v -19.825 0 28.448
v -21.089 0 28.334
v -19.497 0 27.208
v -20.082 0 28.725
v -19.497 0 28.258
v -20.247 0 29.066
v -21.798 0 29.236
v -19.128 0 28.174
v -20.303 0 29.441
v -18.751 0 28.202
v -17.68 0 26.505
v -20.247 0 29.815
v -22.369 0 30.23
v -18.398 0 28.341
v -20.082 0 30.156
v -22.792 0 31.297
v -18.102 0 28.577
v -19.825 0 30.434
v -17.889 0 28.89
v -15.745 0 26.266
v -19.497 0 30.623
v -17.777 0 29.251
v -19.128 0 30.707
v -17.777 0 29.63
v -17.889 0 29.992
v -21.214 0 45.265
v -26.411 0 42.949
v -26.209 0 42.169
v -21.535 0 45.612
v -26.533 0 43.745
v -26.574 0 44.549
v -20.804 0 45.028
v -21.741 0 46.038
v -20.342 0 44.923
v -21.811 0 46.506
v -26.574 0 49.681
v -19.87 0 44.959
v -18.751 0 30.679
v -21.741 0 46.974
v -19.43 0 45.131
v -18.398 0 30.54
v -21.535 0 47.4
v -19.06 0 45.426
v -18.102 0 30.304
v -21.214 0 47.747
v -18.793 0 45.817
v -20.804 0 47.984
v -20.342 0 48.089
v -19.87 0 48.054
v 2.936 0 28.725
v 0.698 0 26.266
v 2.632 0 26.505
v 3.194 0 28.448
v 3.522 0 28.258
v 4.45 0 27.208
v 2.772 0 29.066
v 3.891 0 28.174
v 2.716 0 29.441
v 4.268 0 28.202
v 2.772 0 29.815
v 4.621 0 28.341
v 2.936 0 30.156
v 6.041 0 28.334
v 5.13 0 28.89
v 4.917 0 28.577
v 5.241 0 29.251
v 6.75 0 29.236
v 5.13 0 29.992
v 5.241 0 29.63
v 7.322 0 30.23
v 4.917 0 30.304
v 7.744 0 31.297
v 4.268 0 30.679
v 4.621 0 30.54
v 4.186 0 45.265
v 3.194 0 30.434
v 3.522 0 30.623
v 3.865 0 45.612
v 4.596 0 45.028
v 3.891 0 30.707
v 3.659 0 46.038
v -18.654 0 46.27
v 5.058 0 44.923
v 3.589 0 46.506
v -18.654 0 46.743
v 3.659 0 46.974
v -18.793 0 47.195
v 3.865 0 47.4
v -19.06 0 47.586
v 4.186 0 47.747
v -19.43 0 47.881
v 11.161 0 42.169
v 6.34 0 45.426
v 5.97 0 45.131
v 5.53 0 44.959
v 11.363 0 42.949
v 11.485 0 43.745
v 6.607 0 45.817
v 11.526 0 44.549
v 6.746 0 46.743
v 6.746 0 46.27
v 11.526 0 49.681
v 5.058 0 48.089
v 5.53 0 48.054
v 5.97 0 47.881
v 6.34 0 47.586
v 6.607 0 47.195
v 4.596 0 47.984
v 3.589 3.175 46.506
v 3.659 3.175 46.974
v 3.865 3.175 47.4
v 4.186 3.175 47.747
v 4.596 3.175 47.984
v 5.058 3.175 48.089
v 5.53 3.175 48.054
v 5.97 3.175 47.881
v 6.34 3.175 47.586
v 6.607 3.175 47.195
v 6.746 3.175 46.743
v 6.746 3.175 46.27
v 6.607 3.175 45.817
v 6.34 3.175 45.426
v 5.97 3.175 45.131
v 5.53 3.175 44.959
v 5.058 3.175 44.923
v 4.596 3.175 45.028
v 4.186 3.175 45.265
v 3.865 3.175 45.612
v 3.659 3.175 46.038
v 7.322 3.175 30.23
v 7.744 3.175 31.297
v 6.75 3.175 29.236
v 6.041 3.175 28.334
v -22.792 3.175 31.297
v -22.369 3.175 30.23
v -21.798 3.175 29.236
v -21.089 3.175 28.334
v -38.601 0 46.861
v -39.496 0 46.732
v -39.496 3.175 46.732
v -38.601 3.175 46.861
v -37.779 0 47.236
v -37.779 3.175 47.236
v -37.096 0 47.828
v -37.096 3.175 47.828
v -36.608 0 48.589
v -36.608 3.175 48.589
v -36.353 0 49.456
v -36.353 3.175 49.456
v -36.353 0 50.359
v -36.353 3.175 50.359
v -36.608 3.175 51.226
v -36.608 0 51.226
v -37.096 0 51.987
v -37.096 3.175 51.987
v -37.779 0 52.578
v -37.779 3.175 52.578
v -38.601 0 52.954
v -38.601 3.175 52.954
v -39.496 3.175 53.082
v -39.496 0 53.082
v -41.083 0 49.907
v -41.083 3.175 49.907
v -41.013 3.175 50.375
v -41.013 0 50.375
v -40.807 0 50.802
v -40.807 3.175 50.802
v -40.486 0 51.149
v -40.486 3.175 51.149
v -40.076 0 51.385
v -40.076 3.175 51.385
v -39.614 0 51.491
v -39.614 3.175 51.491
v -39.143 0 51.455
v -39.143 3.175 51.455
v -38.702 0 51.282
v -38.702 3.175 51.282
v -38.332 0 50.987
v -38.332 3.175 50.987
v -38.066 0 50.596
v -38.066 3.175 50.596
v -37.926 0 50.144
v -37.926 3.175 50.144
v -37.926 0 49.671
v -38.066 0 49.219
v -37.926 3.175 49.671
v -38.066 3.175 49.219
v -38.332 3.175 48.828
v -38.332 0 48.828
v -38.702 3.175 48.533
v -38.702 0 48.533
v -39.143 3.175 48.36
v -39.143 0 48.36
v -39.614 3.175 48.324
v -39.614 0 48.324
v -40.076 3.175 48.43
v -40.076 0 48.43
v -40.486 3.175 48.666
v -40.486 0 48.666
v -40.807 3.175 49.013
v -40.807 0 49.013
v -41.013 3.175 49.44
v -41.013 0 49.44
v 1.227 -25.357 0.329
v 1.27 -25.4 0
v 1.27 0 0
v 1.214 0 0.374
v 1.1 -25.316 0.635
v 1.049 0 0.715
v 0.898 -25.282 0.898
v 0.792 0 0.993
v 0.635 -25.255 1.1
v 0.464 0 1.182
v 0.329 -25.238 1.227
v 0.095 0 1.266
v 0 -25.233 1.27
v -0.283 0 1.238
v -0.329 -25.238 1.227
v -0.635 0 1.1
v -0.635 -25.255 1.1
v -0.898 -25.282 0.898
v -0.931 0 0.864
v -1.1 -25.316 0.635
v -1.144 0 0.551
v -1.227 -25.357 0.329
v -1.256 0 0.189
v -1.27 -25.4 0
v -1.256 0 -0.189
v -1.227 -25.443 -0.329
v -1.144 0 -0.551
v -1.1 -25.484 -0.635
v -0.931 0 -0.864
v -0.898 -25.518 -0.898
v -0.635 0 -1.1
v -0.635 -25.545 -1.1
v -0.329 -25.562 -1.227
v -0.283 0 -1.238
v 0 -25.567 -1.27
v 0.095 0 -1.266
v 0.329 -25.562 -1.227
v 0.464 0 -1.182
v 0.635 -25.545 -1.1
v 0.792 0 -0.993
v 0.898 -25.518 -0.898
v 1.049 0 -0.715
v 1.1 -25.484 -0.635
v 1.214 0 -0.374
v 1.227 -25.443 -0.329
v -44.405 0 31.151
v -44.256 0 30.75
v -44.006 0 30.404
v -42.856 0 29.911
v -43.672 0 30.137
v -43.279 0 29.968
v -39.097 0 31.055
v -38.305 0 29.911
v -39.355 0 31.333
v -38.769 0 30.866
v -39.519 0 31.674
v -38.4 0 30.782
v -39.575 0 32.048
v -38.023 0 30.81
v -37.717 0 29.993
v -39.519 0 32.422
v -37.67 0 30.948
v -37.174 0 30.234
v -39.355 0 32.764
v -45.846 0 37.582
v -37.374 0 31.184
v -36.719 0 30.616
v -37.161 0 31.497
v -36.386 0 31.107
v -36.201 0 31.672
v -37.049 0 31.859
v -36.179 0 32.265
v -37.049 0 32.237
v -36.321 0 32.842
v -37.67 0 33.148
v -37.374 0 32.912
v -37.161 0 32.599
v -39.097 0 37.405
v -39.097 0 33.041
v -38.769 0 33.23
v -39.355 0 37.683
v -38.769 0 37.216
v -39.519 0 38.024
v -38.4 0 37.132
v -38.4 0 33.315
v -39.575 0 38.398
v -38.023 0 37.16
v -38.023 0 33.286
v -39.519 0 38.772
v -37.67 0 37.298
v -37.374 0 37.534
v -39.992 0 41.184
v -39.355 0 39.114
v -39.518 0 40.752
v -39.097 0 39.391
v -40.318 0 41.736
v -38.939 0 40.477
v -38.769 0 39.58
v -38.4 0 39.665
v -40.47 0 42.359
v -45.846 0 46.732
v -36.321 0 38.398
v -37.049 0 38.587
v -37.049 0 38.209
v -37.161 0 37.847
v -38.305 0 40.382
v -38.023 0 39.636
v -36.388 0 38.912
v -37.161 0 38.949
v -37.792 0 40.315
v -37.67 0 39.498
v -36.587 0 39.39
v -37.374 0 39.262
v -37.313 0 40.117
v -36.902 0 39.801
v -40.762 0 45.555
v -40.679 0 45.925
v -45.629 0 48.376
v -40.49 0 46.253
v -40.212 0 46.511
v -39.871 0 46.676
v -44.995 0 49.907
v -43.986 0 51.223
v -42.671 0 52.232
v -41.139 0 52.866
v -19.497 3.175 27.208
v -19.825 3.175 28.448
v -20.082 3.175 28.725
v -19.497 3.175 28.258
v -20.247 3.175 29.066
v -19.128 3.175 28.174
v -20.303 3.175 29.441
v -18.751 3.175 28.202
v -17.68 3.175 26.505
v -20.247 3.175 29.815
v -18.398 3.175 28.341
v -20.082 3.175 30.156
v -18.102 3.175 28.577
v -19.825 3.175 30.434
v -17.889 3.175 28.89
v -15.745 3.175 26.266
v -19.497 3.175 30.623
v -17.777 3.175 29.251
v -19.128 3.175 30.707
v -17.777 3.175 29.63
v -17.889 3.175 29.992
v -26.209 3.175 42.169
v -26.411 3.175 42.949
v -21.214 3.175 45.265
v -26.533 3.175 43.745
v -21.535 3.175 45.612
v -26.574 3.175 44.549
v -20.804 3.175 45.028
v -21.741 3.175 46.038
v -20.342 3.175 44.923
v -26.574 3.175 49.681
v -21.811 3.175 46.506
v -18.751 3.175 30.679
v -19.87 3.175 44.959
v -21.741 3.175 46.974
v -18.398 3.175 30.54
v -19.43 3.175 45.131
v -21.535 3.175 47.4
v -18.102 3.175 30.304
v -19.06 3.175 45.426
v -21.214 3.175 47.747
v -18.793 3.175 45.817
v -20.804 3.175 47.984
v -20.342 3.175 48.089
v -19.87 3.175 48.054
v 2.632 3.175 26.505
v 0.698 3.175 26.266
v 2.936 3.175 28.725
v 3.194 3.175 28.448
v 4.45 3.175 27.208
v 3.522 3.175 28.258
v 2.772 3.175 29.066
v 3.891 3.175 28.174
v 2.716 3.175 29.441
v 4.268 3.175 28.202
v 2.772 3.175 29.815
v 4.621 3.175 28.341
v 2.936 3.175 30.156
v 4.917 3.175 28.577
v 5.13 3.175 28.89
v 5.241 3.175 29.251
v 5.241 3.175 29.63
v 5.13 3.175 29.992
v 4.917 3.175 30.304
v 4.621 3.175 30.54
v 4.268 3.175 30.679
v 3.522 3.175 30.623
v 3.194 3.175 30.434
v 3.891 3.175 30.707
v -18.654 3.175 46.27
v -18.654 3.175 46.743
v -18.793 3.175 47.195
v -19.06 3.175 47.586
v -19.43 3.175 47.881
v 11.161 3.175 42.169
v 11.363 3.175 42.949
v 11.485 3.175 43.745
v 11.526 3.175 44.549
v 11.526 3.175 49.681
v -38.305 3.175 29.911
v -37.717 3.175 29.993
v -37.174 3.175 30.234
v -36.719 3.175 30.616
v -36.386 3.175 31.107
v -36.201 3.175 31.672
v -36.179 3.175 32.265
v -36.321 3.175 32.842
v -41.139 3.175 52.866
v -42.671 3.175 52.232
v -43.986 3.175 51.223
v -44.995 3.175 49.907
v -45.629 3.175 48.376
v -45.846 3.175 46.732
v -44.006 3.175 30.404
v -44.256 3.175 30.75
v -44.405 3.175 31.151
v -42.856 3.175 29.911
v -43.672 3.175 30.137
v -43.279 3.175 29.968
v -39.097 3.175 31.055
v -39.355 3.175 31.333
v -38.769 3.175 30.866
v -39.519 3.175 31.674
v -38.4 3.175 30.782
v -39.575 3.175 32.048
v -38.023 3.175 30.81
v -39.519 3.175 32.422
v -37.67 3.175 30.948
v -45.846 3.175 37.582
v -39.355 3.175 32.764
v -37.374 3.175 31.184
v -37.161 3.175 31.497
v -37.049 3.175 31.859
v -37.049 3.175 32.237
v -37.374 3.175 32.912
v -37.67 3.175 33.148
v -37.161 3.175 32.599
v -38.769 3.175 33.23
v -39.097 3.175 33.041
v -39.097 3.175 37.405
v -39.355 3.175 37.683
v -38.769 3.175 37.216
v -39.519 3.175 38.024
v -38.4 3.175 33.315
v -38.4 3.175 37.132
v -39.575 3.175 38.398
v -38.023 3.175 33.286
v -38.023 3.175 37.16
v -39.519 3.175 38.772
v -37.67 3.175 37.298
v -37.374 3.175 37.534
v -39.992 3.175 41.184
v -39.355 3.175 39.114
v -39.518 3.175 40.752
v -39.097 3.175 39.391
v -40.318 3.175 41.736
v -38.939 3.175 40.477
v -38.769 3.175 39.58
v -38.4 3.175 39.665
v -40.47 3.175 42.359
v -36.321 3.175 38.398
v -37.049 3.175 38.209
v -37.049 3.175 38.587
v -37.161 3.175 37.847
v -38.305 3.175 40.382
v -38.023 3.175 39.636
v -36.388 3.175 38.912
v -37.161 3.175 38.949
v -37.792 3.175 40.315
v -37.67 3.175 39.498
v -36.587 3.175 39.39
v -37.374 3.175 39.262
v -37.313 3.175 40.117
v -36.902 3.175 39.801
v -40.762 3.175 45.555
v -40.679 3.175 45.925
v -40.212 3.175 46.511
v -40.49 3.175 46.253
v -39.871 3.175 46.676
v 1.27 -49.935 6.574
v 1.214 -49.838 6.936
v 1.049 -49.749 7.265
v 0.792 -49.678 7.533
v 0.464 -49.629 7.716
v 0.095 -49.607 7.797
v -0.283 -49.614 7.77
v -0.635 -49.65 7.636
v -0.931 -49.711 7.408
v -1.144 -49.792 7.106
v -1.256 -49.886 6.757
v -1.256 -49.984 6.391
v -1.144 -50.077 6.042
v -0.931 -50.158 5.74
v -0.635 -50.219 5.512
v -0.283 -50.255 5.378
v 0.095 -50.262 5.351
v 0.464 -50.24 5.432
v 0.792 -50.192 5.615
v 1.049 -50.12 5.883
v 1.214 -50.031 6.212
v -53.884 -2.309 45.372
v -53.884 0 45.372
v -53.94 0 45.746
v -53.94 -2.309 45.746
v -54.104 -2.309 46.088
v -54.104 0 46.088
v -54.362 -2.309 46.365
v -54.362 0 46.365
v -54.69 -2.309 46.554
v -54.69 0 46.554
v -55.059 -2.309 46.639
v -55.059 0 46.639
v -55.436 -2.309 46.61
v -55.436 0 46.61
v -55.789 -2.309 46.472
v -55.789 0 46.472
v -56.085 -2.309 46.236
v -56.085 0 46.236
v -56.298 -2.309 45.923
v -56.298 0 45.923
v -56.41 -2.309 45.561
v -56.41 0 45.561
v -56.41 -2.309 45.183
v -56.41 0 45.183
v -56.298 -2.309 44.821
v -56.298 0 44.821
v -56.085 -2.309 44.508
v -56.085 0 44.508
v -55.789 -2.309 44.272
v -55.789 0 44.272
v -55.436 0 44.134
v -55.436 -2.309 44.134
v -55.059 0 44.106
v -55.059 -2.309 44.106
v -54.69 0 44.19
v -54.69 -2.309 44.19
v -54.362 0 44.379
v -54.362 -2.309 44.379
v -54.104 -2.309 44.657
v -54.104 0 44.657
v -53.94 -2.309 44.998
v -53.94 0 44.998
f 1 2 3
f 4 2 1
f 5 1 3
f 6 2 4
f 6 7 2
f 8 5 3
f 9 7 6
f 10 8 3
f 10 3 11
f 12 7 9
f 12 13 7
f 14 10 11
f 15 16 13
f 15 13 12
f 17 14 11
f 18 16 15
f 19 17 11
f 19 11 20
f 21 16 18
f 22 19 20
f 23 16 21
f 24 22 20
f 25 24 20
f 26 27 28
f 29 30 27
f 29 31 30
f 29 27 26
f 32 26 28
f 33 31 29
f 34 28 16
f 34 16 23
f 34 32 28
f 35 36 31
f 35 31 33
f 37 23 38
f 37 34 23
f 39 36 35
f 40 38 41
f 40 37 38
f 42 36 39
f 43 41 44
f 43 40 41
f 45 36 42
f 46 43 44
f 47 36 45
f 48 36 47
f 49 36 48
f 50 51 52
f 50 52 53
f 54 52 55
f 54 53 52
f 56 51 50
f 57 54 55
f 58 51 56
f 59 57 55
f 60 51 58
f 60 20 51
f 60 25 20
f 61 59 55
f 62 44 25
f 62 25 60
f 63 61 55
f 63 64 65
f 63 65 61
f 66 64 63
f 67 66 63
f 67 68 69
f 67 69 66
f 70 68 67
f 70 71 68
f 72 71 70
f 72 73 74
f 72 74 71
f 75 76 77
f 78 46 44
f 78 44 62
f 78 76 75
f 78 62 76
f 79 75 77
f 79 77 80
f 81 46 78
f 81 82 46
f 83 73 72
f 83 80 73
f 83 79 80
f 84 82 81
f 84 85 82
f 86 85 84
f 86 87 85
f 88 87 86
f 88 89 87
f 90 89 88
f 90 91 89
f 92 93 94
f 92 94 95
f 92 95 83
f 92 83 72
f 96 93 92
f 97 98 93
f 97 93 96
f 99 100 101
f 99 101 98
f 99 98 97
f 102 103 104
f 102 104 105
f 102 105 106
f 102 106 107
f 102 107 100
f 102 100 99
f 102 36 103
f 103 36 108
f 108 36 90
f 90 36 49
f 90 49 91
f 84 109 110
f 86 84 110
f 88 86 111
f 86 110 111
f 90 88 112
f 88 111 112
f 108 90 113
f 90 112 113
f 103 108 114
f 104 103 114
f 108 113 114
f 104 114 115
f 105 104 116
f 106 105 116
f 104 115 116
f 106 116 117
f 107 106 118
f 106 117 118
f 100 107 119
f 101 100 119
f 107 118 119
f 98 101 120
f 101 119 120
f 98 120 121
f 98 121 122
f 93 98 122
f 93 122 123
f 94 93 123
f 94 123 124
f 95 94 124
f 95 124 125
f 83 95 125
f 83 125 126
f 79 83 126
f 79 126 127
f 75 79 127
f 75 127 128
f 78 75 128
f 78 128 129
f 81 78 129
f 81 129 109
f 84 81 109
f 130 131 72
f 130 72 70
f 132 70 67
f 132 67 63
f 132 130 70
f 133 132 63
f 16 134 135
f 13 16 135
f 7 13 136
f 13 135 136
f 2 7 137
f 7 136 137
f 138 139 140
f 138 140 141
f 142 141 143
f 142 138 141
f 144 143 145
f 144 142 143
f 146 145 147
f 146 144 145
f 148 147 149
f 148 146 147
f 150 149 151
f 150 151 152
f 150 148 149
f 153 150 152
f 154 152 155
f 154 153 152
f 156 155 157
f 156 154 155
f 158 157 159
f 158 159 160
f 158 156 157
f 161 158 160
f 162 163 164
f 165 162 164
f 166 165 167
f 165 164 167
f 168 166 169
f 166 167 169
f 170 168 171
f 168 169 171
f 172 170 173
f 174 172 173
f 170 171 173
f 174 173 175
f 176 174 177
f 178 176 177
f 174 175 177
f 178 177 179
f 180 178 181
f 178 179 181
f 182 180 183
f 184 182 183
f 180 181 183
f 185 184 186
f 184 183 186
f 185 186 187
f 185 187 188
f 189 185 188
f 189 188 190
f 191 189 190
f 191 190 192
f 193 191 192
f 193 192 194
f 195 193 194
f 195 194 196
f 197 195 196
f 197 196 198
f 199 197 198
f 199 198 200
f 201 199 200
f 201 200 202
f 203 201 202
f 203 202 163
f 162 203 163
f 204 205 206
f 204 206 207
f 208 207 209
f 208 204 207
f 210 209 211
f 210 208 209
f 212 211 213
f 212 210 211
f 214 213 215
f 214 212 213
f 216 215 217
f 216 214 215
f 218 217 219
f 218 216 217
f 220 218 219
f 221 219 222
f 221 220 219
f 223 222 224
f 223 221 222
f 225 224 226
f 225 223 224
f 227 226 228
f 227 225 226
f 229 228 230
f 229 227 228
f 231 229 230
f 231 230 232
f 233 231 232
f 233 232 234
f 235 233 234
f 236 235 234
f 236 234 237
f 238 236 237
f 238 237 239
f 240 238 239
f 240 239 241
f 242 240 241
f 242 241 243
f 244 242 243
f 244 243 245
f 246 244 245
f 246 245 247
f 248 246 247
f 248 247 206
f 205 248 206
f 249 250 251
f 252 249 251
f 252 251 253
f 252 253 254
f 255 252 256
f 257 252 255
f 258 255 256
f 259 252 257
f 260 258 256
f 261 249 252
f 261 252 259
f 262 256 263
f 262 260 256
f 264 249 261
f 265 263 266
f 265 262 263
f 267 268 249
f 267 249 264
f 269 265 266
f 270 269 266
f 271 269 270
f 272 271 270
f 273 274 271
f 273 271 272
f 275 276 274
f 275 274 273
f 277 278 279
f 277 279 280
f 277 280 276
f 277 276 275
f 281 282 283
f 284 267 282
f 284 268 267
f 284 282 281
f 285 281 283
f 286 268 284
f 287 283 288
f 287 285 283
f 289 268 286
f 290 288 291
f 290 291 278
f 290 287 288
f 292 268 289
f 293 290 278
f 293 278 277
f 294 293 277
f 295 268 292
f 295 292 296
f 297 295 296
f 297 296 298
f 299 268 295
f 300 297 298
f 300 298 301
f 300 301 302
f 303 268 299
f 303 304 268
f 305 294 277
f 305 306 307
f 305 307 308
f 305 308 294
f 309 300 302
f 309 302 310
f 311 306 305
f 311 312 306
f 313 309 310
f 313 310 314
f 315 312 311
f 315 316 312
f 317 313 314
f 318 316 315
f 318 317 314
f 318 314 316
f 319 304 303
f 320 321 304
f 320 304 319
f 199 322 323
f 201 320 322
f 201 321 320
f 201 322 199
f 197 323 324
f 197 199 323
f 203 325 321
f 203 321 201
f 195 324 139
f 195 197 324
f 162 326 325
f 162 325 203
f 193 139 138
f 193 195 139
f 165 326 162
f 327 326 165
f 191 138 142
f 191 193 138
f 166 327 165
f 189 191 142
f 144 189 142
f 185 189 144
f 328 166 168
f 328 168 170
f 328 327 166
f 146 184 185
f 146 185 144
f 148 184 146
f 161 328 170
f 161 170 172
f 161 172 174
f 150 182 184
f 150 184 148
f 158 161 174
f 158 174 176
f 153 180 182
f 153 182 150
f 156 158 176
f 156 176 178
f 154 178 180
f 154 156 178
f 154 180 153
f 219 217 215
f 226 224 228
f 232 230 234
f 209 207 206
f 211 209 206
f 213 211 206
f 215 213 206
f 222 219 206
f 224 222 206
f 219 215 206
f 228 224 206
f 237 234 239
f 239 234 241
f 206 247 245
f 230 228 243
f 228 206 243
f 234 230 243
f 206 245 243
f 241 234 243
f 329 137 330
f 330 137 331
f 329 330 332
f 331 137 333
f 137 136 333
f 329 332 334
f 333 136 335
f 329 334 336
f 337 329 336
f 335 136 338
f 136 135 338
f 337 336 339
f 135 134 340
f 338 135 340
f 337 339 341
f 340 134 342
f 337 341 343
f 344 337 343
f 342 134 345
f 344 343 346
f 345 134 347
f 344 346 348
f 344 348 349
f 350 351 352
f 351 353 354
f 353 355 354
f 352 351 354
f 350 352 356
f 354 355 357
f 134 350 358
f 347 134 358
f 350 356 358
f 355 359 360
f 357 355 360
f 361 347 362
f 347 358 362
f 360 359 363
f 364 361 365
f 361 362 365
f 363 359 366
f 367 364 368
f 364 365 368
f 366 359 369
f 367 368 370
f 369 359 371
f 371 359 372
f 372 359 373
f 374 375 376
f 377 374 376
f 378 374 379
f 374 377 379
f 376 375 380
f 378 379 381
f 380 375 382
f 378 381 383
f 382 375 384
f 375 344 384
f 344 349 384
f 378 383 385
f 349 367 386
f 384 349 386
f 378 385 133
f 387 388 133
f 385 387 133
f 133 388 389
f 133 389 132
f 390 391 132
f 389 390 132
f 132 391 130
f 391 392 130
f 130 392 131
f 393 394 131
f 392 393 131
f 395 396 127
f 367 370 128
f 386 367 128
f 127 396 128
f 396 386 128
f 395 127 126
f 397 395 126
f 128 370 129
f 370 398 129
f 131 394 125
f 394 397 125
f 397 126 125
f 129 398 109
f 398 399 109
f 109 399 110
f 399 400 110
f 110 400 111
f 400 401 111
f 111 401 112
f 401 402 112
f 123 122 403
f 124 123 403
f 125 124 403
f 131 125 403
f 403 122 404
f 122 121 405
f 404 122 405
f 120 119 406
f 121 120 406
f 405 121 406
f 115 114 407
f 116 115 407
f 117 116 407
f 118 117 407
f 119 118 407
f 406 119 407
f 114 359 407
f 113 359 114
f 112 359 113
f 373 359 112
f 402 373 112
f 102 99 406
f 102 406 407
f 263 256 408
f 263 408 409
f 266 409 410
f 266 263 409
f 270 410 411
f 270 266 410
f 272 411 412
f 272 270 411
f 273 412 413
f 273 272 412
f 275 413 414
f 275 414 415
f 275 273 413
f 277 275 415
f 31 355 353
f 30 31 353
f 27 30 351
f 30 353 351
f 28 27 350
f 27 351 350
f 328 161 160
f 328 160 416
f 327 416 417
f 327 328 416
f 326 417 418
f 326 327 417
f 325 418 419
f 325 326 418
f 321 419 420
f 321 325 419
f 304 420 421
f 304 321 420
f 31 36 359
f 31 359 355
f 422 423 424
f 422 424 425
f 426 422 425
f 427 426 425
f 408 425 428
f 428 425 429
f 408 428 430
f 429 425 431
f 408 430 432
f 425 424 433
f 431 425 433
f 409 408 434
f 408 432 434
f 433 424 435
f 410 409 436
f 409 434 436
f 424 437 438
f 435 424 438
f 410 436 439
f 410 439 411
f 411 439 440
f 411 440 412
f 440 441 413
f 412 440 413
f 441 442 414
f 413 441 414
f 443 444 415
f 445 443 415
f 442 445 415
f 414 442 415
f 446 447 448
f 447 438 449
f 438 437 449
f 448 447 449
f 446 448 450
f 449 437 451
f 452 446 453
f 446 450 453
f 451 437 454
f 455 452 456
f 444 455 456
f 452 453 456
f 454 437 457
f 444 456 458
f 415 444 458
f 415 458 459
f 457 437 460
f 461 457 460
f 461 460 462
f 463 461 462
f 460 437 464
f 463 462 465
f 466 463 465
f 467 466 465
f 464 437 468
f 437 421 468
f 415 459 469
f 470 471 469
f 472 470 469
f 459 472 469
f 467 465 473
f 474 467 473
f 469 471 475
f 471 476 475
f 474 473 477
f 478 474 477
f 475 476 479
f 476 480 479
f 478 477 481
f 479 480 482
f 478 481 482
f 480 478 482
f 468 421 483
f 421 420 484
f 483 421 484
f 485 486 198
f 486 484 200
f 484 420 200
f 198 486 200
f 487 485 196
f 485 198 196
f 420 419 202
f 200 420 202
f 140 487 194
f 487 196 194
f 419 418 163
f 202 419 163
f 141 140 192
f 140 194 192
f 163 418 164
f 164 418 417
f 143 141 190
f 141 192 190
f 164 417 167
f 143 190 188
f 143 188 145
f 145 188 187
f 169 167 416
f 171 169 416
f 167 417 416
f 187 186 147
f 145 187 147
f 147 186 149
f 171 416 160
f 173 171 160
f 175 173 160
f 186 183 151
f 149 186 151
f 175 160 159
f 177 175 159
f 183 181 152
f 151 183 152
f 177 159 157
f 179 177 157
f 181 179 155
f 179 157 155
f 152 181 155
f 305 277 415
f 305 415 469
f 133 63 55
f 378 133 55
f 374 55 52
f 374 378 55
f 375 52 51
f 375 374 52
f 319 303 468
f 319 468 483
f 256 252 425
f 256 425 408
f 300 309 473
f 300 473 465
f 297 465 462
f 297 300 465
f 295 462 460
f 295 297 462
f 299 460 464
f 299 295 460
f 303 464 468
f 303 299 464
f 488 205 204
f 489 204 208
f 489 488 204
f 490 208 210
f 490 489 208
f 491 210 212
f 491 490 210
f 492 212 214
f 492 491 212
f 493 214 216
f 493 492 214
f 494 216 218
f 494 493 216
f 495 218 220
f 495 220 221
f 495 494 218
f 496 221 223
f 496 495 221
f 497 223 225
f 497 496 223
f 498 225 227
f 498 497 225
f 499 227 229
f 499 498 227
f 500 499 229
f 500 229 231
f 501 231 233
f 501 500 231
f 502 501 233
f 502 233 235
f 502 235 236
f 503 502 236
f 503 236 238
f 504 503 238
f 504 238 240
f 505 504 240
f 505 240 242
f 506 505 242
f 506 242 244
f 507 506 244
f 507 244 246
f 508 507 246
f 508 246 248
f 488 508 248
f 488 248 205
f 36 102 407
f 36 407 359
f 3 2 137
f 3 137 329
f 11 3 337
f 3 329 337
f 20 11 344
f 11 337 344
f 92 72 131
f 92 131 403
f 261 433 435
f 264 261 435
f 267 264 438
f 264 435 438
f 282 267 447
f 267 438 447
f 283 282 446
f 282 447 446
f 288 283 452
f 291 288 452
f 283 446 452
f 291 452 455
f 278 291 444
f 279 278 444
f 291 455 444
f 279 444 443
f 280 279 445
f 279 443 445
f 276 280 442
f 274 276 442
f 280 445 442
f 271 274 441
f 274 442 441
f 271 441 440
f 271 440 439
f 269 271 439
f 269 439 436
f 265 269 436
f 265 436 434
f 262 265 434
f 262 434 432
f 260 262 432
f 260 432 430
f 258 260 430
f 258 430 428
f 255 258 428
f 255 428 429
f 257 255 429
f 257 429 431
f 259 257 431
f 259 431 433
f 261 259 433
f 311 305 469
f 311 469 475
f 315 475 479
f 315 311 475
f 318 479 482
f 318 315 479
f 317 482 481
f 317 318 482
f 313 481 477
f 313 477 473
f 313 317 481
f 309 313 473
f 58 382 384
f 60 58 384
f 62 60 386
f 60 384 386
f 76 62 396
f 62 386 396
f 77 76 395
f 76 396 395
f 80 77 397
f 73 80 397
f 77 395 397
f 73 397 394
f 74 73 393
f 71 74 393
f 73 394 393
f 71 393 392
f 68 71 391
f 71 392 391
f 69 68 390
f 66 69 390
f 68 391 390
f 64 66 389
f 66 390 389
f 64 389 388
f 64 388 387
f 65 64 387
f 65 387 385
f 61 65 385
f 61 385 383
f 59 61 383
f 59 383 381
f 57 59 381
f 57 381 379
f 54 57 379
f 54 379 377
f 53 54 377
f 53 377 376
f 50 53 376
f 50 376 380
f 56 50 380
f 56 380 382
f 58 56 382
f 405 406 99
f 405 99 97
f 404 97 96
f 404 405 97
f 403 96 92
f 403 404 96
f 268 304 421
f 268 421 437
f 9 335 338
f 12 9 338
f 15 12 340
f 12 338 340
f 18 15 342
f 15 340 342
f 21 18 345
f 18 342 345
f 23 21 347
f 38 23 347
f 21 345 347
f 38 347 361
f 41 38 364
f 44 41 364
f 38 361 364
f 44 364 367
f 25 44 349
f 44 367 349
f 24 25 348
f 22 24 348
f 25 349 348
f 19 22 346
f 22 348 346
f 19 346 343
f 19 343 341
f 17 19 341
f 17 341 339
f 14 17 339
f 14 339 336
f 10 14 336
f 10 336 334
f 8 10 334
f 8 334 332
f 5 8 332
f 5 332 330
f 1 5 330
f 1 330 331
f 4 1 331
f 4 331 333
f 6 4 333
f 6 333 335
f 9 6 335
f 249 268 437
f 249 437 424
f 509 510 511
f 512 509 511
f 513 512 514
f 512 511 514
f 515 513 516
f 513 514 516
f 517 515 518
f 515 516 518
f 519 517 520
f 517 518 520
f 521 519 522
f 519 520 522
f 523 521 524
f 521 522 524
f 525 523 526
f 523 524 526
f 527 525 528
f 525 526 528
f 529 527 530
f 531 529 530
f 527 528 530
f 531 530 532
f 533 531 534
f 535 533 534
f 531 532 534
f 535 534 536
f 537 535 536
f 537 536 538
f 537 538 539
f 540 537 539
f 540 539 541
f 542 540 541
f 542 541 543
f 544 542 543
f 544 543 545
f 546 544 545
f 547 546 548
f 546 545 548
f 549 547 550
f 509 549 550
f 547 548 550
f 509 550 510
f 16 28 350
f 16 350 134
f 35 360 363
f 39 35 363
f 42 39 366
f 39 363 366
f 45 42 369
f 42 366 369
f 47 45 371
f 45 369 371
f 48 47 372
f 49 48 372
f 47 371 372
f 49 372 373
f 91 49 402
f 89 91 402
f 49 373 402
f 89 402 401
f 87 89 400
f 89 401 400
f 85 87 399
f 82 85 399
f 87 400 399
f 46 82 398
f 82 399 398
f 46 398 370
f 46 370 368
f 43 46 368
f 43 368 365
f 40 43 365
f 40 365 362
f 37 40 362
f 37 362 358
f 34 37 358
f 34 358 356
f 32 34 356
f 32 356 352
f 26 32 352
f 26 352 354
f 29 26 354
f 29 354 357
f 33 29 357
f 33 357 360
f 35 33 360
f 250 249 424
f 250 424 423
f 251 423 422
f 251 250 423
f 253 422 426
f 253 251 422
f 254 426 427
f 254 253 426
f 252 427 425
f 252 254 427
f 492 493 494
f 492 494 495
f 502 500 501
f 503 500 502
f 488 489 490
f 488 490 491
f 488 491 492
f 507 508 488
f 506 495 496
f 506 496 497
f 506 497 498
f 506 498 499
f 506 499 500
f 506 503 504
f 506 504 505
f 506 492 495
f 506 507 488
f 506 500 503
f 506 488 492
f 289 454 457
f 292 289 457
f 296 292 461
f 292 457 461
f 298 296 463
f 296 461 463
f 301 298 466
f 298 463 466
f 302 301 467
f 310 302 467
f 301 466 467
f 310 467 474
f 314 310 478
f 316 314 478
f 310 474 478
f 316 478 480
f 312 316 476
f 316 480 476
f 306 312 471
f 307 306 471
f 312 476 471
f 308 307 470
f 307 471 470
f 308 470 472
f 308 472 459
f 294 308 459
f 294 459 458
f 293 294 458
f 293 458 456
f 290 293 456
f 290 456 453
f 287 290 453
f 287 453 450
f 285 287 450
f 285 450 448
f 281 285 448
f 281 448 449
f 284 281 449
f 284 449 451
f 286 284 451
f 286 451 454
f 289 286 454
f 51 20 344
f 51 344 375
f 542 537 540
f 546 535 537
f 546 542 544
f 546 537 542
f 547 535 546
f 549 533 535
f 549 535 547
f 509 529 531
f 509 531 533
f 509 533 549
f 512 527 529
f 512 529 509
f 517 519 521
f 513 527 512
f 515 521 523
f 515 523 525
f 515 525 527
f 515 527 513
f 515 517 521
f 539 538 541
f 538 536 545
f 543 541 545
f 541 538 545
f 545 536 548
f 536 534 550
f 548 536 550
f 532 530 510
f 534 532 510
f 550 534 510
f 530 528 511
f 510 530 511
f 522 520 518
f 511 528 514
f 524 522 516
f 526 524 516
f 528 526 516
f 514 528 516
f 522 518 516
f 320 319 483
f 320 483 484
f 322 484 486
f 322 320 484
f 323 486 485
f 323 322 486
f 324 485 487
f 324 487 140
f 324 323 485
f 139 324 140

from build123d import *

# Parameters (mm, degrees)
F1_DEPTH    = 3.175
F2_D        = 3.175
F2_DEPTH    = 25.4
F2_TIP      = 0.9538662327
F3_D        = 2.54
F3_DEPTH    = 25.4
F3_TIP      = 0.7630929862
F5_DEPTH    = 3.175
F6_D        = 3.175
F6_DEPTH    = 25.4
F6_TIP      = 0.9538662327
F7_D        = 2.54
F7_DEPTH    = 25.4
F7_TIP      = 0.7630929862
F8_T1_DEPTH = 19.6141007567
F8_T3_DEPTH = 12.9058575482
F8_T5_DEPTH = 9.2647678202
F9_R        = 1.27
F10_DEPTH   = 2.3090909091
F11_R       = 1.27


# Not quite as in the source:
# - a fillet or chamfer that OpenCascade refuses, or shapes differently, is made with other operations: its cross-section is extruded or revolved along the edge and cut away or added


with BuildPart() as f1:
    # F0 (on Front) → F1 (new body)
    with BuildSketch(Plane.XZ):
        with BuildLine():
            ThreePointArc((-40.7624131311, 45.5551980838), (-40.3604208215, 46.3926978741), (-39.4958033942, 46.7324631164))
            ThreePointArc((-39.4958033942, 46.7324631164), (-36.3208033942, 49.9074631164), (-39.4958033942, 53.0824631164))
            ThreePointArc((-39.4958033942, 53.0824631164), (-43.9859314547, 51.222591177), (-45.8458033942, 46.7324631164))
            Line((-45.8458033942, 46.7324631164), (-45.8458033942, 37.5822147164))
            Line((-45.8458033942, 37.5822147164), (-44.4046161923, 31.1511978093))
            ThreePointArc((-44.4046161923, 31.1511978093), (-43.8477734395, 30.2591434316), (-42.8555409547, 29.9108482117))
            Line((-42.8555409547, 29.9108482117), (-38.3051783942, 29.9108482117))
            ThreePointArc((-38.3051783942, 29.9108482117), (-36.5353982281, 30.8498925673), (-36.3208033942, 32.841845176))
            Line((-36.3208033942, 32.841845176), (-36.3208033942, 38.3980881164))
            ThreePointArc((-36.3208033942, 38.3980881164), (-36.9020133752, 39.8012531354), (-38.3051783942, 40.3824631164))
            ThreePointArc((-38.3051783942, 40.3824631164), (-39.7708205612, 40.950778212), (-40.4701995839, 42.3585985103))
            Line((-40.4701995839, 42.3585985103), (-40.7624131311, 45.5551980838))
        make_face()
    extrude(amount=-F1_DEPTH)

    # F2
    with Locations(Plane.XZ):
        with Locations((-39.4958033942, 49.9074631164)):
            Hole(F2_D / 2, depth=F2_DEPTH)
            with Locations((0, 0, -(F2_DEPTH + F2_TIP / 2))):  # 118° drill point
                Cone(0, F2_D / 2, F2_TIP, mode=Mode.SUBTRACT)

    # F3
    with Locations(Plane.XZ):
        with Locations((-38.3051783942, 38.3980881164), (-38.3051783942, 32.0480881164)):
            Hole(F3_D / 2, depth=F3_DEPTH)
            with Locations((0, 0, -(F3_DEPTH + F3_TIP / 2))):  # 118° drill point
                Cone(0, F3_D / 2, F3_TIP, mode=Mode.SUBTRACT)


with BuildPart() as f5:
    # F4 (on Front) → F5 (new body)
    with BuildSketch(Plane.XZ):
        Polygon((11.5262488782, 49.6812058449), (-26.5737511218, 49.6812058449), (-26.5737511218, 46.5062058449), (-26.5737511218, 43.3312058449), (-22.2081261218, 29.4405808449), (-19.0331261218, 26.2655808449), (3.9856238782, 26.2655808449), (7.1606238782, 29.4405808449), (11.5262488782, 43.3312058449), (11.5262488782, 46.5062058449), align=None)
    extrude(amount=-F5_DEPTH)

    # F6
    with Locations(Plane.XZ):
        with Locations((-20.2237511218, 46.5062058449), (5.1762488782, 46.5062058449)):
            Hole(F6_D / 2, depth=F6_DEPTH)
            with Locations((0, 0, -(F6_DEPTH + F6_TIP / 2))):  # 118° drill point
                Cone(0, F6_D / 2, F6_TIP, mode=Mode.SUBTRACT)

    # F7
    with Locations(Plane.XZ):
        with Locations((-19.0331261218, 29.4405808449), (3.9856238782, 29.4405808449)):
            Hole(F7_D / 2, depth=F7_DEPTH)
            with Locations((0, 0, -(F7_DEPTH + F7_TIP / 2))):  # 118° drill point
                Cone(0, F7_D / 2, F7_TIP, mode=Mode.SUBTRACT)

    # F8: fillet of radius 7.9375 on 6 edges, made by hand

    # F8_s2 → F8_t1 (cut)
    with BuildSketch(Plane.XZ.offset(-11.3945503783)):
        with BuildLine():
            ThreePointArc((6.3104638026, 28.5904207692), (3.7353534713, 26.8697870556), (0.6978037269, 26.2655808449))
            Line((0.6978037269, 26.2655808449), (3.9856238782, 26.2655808449))
            Line((3.9856238782, 26.2655808449), (6.3104638026, 28.5904207692))
        make_face()
        with BuildLine():
            ThreePointArc((-21.3579660461, 28.5904207692), (-18.7828557148, 26.8697870556), (-15.7453059704, 26.2655808449))
            Line((-15.7453059704, 26.2655808449), (-19.0331261218, 26.2655808449))
            Line((-19.0331261218, 26.2655808449), (-21.3579660461, 28.5904207692))
        make_face()
    extrude(amount=F8_T1_DEPTH, mode=Mode.SUBTRACT)

    # F8_s4 → F8_t3 (cut)
    with BuildSketch(Plane.XZ.offset(-8.0404287741)):
        with BuildLine():
            ThreePointArc((7.7441378587, 31.2972162371), (6.9595727284, 29.562454936), (5.7844728064, 28.0644297731))
            Line((5.7844728064, 28.0644297731), (7.1606238782, 29.4405808449))
            Line((7.1606238782, 29.4405808449), (7.7441378587, 31.2972162371))
        make_face()
        with BuildLine():
            ThreePointArc((-22.7916401022, 31.2972162371), (-22.0070749719, 29.562454936), (-20.8319750499, 28.0644297731))
            Line((-20.8319750499, 28.0644297731), (-22.2081261218, 29.4405808449))
            Line((-22.2081261218, 29.4405808449), (-22.7916401022, 31.2972162371))
        make_face()
    extrude(amount=F8_T3_DEPTH, mode=Mode.SUBTRACT)

    # F8_s6 → F8_t5 (cut)
    with BuildSketch(Plane.XZ.offset(-6.2198839101)):
        with BuildLine():
            ThreePointArc((11.5262488782, 44.5491594089), (11.434424023, 43.3452957233), (11.1610740061, 42.1692857973))
            Line((11.1610740061, 42.1692857973), (11.5262488782, 43.3312058449))
            Line((11.5262488782, 43.3312058449), (11.5262488782, 44.5491594089))
        make_face()
        with BuildLine():
            ThreePointArc((-26.5737511218, 44.5491594089), (-26.4819262665, 43.3452957233), (-26.2085762497, 42.1692857973))
            Line((-26.2085762497, 42.1692857973), (-26.5737511218, 43.3312058449))
            Line((-26.5737511218, 43.3312058449), (-26.5737511218, 44.5491594089))
        make_face()
    extrude(amount=F8_T5_DEPTH, mode=Mode.SUBTRACT)


with BuildPart() as f10:
    # F9 (on Front) → F10 (new body)
    with BuildSketch(Plane.XZ):
        with Locations((-55.1536940038, 45.372158289)):
            Circle(F9_R)
    extrude(amount=F10_DEPTH)


with BuildPart() as f13:
    # F13: sweep along a path in F12
    with BuildLine(Plane.YZ) as f13_path:
        Line((0, 0), (-25.4, 0))
        Line((-25.4, 0), (-49.9345159877, 6.5740037456))
    # F11 (on Front) → F13 (sweep)
    with BuildSketch(Plane.XZ):
        Circle(F11_R)
    sweep(path=f13_path.line, transition=Transition.RIGHT)


solid = Compound([f1.part, f5.part, f10.part, f13.part])
